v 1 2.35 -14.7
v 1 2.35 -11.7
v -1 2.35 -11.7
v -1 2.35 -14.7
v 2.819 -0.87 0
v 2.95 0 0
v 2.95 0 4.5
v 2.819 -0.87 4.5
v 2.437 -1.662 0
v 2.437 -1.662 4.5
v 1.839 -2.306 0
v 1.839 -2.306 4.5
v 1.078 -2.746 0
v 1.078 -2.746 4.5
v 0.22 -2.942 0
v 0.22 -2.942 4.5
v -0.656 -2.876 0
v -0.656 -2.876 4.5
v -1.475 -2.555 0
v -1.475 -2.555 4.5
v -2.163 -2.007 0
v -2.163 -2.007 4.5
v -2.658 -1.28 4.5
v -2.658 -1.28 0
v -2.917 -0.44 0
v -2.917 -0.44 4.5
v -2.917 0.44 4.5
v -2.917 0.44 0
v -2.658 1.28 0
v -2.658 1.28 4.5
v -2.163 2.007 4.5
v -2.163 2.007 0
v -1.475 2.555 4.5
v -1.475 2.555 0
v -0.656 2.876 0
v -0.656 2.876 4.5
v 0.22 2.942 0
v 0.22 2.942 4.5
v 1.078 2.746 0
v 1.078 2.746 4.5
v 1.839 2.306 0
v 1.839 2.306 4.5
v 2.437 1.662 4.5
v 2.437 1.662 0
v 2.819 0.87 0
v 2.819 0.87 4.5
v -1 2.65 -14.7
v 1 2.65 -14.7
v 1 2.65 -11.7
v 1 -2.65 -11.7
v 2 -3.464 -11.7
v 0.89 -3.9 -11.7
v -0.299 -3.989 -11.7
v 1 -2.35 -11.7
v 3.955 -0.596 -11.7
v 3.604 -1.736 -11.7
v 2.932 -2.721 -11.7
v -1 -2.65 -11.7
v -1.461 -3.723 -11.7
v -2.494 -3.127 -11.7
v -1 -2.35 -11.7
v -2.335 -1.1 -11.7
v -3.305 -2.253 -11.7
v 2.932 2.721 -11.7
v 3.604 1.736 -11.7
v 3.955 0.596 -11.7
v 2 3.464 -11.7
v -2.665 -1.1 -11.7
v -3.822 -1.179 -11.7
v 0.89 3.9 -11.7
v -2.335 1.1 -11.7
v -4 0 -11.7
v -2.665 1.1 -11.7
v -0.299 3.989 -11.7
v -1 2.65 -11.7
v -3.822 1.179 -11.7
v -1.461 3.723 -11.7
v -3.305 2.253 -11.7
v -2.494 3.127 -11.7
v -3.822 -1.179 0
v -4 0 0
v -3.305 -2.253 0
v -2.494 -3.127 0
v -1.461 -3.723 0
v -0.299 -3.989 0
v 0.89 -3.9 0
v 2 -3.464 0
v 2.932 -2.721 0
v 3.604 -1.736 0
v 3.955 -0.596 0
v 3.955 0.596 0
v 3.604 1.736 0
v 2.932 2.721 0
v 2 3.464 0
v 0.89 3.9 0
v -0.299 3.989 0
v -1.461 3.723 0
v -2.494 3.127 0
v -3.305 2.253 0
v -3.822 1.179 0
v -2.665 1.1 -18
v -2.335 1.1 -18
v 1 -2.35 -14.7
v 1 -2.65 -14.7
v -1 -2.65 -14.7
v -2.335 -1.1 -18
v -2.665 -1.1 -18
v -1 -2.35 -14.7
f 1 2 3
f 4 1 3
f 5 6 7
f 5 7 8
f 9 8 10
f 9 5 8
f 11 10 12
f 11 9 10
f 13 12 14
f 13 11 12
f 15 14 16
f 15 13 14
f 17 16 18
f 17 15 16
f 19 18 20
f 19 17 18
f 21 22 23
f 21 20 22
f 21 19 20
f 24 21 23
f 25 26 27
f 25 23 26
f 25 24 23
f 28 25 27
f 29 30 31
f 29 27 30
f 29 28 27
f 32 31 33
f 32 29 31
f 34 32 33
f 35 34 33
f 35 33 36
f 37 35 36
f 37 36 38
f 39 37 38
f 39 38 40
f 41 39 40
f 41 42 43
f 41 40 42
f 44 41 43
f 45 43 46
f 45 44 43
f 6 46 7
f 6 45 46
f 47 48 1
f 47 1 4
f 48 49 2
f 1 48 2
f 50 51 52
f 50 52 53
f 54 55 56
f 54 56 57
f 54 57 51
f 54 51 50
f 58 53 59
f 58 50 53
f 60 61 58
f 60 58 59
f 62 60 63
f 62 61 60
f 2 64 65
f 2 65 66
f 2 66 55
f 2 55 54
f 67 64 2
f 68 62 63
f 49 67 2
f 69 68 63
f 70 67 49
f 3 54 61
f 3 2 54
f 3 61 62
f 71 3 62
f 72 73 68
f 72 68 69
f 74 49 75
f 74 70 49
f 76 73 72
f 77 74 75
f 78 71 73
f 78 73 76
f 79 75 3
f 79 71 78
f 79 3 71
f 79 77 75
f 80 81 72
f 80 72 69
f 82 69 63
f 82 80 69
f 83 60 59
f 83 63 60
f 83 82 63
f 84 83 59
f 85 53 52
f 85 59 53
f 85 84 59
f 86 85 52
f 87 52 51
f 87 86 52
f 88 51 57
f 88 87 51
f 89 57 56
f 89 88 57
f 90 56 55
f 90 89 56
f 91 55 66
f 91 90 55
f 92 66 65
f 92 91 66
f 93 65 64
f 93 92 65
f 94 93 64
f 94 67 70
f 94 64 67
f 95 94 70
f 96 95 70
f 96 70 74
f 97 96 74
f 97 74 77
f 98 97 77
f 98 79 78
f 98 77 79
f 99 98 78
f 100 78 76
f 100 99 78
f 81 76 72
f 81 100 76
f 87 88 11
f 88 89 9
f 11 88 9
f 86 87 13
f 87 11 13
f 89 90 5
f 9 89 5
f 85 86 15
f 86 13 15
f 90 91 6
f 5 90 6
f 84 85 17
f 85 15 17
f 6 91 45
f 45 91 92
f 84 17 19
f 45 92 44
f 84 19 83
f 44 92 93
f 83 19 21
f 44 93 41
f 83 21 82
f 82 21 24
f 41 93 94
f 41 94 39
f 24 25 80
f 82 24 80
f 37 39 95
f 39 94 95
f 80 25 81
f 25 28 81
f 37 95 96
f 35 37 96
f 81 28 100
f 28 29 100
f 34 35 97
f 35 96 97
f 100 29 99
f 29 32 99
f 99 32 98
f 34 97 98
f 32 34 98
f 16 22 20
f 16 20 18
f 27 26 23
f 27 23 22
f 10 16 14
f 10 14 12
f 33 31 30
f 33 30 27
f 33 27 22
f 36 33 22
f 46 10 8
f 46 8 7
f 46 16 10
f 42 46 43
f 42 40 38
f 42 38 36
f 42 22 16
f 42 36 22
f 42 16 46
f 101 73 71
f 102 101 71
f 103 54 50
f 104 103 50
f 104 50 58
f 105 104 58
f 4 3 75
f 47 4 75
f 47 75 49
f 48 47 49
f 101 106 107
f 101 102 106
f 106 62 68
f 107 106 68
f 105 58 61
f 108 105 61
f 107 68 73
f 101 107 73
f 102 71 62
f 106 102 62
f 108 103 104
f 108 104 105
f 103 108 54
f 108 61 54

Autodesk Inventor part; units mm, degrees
ref_plane "YZ Plane" through (0, 0, 0) normal (1, 0, 0) x (0, 1, 0)
ref_plane "XZ Plane" through (0, 0, 0) normal (0, 1, 0) x (-1, 0, 0)
ref_plane "XY Plane" through (0, 0, 0) normal (0, 0, 1) x (1, 0, 0)
sketch "Sketch1" plane through (0, 0, 0) normal (0, 0, 1) x (1, 0, 0)
  circle A0 centre (0, 0) radius 2.95
  dimension "d0" = 5.9
extrude "Extrusion1" add sketch "Sketch1" along normal blind 4.5
sketch "Sketch2" plane through (0, 0, 0) normal (0, 0, -1) x (-1, 0, 0)
  circle A0 centre (0, 0) radius 4
  dimension "d3" = 8
extrude "Extrusion2" add sketch "Sketch2" along normal blind 11.7
sketch "Sketch3" plane through (0, 0, -11.7) normal (0, 0, -1) x (-1, 0, 0)
  line L0 (2.665, 1.1) -> (2.335, 1.1)
  line L1 (2.335, 1.1) -> (2.335, -1.1)
  line L2 (2.335, -1.1) -> (2.665, -1.1)
  line L3 (2.665, -1.1) -> (2.665, 1.1)
  line L4 (2.5, 1.1) -> (2.5, -1.1) construction
  line L5 (5.6, 0) -> (-5.6, 0) construction
  point P0 (0, 0)
  point P1 (2.5, 0)
  dimension "d6" = 0.33
  dimension "d7" = 2.2
  dimension "d8" = 2.5
extrude "Extrusion3" add sketch "Sketch3" along normal blind 6.3
sketch "Sketch4" plane through (0, 0, -11.7) normal (0, 0, -1) x (-1, 0, 0)
  line L0 (1, 2.65) -> (-1, 2.65)
  line L1 (-1, 2.65) -> (-1, 2.35)
  line L2 (-1, 2.35) -> (1, 2.35)
  line L3 (1, 2.35) -> (1, 2.65)
  line L4 (1, -2.35) -> (-1, -2.35)
  line L5 (-1, -2.35) -> (-1, -2.65)
  line L6 (-1, -2.65) -> (1, -2.65)
  line L7 (1, -2.65) -> (1, -2.35)
  line L8 (0, -5.6) -> (0, 5.6) projected
  line L9 (1, 2.5) -> (-1, 2.5) construction
  line L10 (-1, -2.5) -> (1, -2.5) construction
  line L11 (5.6, 0) -> (-5.6, 0) construction
  point P0 (0, 0)
  point P1 (0, 2.35)
  dimension "d11" = 2
  dimension "d12" = 0.3
  dimension "d13" = 5
extrude "Extrusion4" add sketch "Sketch4" along normal blind 3
properties part number "StereoBuchseEinbau"
